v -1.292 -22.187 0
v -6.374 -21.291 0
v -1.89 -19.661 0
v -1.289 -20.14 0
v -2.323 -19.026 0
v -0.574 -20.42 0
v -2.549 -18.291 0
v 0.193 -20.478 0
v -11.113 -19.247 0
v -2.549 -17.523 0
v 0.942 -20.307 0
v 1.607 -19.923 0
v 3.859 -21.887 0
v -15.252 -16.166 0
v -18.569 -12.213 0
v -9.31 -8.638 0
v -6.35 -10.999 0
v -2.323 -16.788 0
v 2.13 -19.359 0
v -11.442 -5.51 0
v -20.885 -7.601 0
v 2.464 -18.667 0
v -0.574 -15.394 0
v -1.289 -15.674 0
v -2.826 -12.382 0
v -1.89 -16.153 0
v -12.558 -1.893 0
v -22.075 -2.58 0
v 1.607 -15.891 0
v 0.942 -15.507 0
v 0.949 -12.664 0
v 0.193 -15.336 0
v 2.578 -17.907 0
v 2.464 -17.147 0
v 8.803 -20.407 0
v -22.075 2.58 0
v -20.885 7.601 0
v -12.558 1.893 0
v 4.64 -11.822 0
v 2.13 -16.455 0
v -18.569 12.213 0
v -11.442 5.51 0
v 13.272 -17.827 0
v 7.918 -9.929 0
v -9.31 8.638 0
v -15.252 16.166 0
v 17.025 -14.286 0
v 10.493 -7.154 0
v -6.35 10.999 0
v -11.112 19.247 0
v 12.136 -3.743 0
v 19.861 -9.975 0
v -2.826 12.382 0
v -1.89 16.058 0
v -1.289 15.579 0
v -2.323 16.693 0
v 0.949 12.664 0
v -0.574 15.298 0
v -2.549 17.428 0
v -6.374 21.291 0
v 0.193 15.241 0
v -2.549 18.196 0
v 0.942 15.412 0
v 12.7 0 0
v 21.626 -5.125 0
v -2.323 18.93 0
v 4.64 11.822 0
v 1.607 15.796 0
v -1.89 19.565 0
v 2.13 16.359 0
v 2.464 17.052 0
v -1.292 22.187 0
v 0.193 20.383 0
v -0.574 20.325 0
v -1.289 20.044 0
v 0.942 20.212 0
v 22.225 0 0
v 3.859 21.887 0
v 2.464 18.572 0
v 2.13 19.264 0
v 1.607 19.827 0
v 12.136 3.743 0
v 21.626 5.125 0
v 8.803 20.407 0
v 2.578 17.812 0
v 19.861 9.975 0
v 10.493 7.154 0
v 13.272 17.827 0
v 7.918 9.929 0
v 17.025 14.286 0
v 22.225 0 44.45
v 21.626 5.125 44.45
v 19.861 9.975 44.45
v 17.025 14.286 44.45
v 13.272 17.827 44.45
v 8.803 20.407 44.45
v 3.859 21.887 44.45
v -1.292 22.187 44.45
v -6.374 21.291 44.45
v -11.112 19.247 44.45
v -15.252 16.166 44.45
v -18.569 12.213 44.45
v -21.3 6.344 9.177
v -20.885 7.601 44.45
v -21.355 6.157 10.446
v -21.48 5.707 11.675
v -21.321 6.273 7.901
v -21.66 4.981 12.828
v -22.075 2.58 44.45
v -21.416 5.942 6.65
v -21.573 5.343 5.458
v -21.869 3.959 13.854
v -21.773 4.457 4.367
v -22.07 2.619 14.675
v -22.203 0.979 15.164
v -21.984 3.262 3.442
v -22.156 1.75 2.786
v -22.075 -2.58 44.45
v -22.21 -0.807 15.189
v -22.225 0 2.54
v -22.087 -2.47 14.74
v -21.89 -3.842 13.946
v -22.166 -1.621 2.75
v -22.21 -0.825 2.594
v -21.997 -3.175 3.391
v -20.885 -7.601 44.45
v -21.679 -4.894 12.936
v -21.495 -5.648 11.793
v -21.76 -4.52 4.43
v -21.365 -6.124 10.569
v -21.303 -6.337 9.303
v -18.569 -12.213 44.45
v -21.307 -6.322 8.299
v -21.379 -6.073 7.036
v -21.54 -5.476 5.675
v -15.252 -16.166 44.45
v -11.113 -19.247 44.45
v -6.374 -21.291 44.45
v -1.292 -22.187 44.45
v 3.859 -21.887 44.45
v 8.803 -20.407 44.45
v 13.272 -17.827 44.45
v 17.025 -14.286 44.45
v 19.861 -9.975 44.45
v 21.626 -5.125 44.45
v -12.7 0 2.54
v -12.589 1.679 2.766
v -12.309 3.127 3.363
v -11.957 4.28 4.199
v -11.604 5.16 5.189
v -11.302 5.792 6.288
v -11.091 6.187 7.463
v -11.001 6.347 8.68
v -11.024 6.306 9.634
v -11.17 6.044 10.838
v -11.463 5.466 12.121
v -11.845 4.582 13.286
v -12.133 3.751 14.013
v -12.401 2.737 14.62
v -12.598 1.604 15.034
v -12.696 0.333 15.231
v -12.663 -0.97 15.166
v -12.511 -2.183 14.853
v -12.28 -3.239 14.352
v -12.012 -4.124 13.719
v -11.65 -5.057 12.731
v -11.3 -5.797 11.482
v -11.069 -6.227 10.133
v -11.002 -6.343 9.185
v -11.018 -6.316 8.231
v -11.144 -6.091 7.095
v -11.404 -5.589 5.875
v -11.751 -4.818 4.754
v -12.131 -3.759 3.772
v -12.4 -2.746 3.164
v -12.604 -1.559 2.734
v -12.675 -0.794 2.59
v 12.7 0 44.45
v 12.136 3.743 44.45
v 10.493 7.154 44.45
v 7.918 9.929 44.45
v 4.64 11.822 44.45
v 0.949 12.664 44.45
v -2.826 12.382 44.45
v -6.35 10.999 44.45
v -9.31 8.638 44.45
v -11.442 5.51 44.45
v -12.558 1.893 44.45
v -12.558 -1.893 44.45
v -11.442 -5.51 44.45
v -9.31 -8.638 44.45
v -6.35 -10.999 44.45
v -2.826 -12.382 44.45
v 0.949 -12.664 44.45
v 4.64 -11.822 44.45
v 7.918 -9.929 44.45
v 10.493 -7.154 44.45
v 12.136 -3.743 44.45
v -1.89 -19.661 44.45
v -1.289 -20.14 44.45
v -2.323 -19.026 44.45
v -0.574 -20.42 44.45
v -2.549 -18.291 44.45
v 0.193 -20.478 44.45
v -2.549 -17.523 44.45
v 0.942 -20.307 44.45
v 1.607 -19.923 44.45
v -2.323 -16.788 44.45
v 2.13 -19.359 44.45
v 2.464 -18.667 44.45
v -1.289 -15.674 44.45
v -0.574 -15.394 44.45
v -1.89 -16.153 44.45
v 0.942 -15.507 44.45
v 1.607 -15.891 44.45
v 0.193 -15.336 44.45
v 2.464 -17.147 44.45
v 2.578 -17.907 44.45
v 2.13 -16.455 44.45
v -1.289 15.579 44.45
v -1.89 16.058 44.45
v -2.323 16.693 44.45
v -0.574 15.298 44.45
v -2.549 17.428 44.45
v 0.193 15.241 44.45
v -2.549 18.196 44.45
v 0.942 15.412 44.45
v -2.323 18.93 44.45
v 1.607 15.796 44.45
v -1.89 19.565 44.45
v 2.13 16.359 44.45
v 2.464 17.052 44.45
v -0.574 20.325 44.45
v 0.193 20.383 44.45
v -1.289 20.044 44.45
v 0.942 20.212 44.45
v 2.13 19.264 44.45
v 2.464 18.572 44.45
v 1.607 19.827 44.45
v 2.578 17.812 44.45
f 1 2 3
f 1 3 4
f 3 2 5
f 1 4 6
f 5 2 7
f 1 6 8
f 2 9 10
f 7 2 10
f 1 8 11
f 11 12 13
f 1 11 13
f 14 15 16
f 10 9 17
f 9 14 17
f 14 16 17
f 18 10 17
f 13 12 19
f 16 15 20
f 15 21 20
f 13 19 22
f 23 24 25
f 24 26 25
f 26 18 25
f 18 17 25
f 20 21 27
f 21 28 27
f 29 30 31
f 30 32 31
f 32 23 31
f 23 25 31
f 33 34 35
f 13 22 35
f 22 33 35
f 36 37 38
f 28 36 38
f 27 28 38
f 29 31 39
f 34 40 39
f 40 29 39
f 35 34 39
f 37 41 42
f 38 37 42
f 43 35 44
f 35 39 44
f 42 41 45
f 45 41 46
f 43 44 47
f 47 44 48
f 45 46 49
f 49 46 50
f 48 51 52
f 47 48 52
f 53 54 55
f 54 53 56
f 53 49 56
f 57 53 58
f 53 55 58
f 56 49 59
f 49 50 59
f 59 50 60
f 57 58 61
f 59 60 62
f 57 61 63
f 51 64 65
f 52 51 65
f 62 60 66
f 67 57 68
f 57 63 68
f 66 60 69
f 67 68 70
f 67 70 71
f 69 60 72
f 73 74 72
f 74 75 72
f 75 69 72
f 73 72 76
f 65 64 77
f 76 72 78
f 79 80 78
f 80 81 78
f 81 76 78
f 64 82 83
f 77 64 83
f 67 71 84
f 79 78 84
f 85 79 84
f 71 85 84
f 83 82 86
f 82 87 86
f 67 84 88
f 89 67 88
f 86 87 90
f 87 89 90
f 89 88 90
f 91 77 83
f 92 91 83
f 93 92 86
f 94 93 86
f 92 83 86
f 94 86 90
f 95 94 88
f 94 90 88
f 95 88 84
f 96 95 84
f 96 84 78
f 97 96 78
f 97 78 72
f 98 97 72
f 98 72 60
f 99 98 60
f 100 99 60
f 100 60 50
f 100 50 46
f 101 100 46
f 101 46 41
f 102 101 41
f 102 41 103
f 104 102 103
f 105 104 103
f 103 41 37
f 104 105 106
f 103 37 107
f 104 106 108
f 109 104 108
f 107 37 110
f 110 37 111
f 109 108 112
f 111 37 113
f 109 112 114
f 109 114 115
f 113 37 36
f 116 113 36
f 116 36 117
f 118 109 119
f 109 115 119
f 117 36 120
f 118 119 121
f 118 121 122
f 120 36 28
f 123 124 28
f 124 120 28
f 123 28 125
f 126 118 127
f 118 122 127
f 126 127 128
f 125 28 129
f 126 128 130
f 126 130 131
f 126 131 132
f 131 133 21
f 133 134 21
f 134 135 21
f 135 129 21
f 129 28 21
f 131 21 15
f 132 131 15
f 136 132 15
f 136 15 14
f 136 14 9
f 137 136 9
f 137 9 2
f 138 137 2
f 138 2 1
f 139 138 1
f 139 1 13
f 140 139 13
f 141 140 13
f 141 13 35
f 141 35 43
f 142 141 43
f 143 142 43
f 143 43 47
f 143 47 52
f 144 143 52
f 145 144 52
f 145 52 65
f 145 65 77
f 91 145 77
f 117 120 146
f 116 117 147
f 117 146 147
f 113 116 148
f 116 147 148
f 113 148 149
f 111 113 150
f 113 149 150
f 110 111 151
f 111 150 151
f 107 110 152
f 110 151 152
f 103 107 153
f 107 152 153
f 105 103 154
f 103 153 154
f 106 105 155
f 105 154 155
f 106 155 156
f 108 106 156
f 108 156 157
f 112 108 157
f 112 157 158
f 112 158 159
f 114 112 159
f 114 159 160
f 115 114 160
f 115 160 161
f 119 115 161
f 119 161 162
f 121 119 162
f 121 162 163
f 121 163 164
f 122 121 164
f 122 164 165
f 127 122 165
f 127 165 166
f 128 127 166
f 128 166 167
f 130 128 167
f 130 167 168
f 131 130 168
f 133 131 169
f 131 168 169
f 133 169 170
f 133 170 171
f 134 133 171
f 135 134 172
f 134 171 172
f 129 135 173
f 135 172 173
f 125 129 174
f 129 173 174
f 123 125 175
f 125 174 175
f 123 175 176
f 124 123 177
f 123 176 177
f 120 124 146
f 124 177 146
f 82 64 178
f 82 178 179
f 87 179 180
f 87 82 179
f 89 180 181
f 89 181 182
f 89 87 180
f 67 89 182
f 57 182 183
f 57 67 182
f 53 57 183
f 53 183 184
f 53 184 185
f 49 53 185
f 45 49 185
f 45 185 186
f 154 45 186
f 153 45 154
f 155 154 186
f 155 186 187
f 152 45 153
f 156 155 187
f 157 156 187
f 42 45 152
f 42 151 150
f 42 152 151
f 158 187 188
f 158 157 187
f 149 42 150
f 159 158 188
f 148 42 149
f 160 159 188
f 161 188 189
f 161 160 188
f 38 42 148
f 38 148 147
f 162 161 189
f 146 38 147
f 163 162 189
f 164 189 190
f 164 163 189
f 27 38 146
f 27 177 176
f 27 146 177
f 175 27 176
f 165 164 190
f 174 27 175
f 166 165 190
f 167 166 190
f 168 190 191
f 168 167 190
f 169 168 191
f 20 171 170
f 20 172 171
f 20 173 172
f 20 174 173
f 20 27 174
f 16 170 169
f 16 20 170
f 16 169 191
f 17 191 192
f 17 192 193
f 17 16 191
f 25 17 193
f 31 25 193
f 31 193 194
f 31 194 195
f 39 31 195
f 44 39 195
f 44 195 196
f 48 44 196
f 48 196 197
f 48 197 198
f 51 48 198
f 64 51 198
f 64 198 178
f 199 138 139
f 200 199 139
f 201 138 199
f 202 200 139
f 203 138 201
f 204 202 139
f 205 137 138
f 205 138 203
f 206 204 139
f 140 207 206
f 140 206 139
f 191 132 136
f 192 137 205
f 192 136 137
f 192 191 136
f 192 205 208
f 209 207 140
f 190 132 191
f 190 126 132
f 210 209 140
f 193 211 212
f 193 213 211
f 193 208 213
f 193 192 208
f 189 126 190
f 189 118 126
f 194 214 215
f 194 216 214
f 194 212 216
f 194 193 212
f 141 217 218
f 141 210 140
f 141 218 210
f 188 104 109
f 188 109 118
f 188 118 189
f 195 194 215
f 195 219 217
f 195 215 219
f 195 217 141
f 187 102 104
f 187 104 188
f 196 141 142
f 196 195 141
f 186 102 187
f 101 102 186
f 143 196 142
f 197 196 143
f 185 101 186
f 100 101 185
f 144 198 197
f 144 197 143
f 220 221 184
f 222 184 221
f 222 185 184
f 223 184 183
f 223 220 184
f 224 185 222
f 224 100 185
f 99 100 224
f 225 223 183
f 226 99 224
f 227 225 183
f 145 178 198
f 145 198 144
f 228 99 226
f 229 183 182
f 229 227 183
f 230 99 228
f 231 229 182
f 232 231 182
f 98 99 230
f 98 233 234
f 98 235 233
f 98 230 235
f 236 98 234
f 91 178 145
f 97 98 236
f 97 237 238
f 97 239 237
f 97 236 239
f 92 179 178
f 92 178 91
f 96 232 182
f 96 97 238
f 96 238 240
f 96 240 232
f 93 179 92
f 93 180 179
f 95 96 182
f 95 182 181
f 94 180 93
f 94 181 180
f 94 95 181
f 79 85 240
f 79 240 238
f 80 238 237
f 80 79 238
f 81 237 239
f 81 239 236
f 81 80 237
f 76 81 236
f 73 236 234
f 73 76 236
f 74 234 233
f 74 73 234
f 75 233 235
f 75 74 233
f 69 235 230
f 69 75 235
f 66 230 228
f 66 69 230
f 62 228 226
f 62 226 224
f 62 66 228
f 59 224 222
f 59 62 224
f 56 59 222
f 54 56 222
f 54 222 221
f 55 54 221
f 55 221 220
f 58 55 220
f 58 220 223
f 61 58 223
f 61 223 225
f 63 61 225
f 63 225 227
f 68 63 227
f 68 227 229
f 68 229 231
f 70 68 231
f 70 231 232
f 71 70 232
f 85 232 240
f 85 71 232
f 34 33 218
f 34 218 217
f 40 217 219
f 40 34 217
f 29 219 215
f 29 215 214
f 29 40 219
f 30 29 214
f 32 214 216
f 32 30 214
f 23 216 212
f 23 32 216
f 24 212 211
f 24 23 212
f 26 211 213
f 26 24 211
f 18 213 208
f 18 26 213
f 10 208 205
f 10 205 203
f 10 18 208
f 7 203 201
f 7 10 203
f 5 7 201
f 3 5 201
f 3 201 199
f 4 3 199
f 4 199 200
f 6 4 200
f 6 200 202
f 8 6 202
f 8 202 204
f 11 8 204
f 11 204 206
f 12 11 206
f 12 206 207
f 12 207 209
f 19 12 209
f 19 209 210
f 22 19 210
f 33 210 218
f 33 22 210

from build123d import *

# Parameters (mm, degrees)
SKETCH1_R           = 22.225
SKETCH1_R_2         = 12.7
SKETCH1_R_3         = 2.5781
BOSS_EXTRUDE1_DEPTH = 44.45
SKETCH2_R           = 6.35
CUT_EXTRUDE1_DEPTH  = 44.45


with BuildPart() as part:
    # Sketch1 → Boss-Extrude1 (new body)
    with BuildSketch(Plane.XY):
        Circle(SKETCH1_R)
        Circle(SKETCH1_R_2, mode=Mode.SUBTRACT)
        with Locations((0, 17.81175)):
            Circle(SKETCH1_R_3, mode=Mode.SUBTRACT)
        with Locations((0, -17.907)):
            Circle(SKETCH1_R_3, mode=Mode.SUBTRACT)
    extrude(amount=BOSS_EXTRUDE1_DEPTH)

    # Sketch2 → Cut-Extrude1 (cut)
    with BuildSketch(Plane(origin=(0, 0, 0), x_dir=(0, 0, -1), z_dir=(1, 0, 0))):
        with Locations((-8.89, 0)):
            Circle(SKETCH2_R)
    extrude(amount=-CUT_EXTRUDE1_DEPTH, mode=Mode.SUBTRACT)


solid = part.part
